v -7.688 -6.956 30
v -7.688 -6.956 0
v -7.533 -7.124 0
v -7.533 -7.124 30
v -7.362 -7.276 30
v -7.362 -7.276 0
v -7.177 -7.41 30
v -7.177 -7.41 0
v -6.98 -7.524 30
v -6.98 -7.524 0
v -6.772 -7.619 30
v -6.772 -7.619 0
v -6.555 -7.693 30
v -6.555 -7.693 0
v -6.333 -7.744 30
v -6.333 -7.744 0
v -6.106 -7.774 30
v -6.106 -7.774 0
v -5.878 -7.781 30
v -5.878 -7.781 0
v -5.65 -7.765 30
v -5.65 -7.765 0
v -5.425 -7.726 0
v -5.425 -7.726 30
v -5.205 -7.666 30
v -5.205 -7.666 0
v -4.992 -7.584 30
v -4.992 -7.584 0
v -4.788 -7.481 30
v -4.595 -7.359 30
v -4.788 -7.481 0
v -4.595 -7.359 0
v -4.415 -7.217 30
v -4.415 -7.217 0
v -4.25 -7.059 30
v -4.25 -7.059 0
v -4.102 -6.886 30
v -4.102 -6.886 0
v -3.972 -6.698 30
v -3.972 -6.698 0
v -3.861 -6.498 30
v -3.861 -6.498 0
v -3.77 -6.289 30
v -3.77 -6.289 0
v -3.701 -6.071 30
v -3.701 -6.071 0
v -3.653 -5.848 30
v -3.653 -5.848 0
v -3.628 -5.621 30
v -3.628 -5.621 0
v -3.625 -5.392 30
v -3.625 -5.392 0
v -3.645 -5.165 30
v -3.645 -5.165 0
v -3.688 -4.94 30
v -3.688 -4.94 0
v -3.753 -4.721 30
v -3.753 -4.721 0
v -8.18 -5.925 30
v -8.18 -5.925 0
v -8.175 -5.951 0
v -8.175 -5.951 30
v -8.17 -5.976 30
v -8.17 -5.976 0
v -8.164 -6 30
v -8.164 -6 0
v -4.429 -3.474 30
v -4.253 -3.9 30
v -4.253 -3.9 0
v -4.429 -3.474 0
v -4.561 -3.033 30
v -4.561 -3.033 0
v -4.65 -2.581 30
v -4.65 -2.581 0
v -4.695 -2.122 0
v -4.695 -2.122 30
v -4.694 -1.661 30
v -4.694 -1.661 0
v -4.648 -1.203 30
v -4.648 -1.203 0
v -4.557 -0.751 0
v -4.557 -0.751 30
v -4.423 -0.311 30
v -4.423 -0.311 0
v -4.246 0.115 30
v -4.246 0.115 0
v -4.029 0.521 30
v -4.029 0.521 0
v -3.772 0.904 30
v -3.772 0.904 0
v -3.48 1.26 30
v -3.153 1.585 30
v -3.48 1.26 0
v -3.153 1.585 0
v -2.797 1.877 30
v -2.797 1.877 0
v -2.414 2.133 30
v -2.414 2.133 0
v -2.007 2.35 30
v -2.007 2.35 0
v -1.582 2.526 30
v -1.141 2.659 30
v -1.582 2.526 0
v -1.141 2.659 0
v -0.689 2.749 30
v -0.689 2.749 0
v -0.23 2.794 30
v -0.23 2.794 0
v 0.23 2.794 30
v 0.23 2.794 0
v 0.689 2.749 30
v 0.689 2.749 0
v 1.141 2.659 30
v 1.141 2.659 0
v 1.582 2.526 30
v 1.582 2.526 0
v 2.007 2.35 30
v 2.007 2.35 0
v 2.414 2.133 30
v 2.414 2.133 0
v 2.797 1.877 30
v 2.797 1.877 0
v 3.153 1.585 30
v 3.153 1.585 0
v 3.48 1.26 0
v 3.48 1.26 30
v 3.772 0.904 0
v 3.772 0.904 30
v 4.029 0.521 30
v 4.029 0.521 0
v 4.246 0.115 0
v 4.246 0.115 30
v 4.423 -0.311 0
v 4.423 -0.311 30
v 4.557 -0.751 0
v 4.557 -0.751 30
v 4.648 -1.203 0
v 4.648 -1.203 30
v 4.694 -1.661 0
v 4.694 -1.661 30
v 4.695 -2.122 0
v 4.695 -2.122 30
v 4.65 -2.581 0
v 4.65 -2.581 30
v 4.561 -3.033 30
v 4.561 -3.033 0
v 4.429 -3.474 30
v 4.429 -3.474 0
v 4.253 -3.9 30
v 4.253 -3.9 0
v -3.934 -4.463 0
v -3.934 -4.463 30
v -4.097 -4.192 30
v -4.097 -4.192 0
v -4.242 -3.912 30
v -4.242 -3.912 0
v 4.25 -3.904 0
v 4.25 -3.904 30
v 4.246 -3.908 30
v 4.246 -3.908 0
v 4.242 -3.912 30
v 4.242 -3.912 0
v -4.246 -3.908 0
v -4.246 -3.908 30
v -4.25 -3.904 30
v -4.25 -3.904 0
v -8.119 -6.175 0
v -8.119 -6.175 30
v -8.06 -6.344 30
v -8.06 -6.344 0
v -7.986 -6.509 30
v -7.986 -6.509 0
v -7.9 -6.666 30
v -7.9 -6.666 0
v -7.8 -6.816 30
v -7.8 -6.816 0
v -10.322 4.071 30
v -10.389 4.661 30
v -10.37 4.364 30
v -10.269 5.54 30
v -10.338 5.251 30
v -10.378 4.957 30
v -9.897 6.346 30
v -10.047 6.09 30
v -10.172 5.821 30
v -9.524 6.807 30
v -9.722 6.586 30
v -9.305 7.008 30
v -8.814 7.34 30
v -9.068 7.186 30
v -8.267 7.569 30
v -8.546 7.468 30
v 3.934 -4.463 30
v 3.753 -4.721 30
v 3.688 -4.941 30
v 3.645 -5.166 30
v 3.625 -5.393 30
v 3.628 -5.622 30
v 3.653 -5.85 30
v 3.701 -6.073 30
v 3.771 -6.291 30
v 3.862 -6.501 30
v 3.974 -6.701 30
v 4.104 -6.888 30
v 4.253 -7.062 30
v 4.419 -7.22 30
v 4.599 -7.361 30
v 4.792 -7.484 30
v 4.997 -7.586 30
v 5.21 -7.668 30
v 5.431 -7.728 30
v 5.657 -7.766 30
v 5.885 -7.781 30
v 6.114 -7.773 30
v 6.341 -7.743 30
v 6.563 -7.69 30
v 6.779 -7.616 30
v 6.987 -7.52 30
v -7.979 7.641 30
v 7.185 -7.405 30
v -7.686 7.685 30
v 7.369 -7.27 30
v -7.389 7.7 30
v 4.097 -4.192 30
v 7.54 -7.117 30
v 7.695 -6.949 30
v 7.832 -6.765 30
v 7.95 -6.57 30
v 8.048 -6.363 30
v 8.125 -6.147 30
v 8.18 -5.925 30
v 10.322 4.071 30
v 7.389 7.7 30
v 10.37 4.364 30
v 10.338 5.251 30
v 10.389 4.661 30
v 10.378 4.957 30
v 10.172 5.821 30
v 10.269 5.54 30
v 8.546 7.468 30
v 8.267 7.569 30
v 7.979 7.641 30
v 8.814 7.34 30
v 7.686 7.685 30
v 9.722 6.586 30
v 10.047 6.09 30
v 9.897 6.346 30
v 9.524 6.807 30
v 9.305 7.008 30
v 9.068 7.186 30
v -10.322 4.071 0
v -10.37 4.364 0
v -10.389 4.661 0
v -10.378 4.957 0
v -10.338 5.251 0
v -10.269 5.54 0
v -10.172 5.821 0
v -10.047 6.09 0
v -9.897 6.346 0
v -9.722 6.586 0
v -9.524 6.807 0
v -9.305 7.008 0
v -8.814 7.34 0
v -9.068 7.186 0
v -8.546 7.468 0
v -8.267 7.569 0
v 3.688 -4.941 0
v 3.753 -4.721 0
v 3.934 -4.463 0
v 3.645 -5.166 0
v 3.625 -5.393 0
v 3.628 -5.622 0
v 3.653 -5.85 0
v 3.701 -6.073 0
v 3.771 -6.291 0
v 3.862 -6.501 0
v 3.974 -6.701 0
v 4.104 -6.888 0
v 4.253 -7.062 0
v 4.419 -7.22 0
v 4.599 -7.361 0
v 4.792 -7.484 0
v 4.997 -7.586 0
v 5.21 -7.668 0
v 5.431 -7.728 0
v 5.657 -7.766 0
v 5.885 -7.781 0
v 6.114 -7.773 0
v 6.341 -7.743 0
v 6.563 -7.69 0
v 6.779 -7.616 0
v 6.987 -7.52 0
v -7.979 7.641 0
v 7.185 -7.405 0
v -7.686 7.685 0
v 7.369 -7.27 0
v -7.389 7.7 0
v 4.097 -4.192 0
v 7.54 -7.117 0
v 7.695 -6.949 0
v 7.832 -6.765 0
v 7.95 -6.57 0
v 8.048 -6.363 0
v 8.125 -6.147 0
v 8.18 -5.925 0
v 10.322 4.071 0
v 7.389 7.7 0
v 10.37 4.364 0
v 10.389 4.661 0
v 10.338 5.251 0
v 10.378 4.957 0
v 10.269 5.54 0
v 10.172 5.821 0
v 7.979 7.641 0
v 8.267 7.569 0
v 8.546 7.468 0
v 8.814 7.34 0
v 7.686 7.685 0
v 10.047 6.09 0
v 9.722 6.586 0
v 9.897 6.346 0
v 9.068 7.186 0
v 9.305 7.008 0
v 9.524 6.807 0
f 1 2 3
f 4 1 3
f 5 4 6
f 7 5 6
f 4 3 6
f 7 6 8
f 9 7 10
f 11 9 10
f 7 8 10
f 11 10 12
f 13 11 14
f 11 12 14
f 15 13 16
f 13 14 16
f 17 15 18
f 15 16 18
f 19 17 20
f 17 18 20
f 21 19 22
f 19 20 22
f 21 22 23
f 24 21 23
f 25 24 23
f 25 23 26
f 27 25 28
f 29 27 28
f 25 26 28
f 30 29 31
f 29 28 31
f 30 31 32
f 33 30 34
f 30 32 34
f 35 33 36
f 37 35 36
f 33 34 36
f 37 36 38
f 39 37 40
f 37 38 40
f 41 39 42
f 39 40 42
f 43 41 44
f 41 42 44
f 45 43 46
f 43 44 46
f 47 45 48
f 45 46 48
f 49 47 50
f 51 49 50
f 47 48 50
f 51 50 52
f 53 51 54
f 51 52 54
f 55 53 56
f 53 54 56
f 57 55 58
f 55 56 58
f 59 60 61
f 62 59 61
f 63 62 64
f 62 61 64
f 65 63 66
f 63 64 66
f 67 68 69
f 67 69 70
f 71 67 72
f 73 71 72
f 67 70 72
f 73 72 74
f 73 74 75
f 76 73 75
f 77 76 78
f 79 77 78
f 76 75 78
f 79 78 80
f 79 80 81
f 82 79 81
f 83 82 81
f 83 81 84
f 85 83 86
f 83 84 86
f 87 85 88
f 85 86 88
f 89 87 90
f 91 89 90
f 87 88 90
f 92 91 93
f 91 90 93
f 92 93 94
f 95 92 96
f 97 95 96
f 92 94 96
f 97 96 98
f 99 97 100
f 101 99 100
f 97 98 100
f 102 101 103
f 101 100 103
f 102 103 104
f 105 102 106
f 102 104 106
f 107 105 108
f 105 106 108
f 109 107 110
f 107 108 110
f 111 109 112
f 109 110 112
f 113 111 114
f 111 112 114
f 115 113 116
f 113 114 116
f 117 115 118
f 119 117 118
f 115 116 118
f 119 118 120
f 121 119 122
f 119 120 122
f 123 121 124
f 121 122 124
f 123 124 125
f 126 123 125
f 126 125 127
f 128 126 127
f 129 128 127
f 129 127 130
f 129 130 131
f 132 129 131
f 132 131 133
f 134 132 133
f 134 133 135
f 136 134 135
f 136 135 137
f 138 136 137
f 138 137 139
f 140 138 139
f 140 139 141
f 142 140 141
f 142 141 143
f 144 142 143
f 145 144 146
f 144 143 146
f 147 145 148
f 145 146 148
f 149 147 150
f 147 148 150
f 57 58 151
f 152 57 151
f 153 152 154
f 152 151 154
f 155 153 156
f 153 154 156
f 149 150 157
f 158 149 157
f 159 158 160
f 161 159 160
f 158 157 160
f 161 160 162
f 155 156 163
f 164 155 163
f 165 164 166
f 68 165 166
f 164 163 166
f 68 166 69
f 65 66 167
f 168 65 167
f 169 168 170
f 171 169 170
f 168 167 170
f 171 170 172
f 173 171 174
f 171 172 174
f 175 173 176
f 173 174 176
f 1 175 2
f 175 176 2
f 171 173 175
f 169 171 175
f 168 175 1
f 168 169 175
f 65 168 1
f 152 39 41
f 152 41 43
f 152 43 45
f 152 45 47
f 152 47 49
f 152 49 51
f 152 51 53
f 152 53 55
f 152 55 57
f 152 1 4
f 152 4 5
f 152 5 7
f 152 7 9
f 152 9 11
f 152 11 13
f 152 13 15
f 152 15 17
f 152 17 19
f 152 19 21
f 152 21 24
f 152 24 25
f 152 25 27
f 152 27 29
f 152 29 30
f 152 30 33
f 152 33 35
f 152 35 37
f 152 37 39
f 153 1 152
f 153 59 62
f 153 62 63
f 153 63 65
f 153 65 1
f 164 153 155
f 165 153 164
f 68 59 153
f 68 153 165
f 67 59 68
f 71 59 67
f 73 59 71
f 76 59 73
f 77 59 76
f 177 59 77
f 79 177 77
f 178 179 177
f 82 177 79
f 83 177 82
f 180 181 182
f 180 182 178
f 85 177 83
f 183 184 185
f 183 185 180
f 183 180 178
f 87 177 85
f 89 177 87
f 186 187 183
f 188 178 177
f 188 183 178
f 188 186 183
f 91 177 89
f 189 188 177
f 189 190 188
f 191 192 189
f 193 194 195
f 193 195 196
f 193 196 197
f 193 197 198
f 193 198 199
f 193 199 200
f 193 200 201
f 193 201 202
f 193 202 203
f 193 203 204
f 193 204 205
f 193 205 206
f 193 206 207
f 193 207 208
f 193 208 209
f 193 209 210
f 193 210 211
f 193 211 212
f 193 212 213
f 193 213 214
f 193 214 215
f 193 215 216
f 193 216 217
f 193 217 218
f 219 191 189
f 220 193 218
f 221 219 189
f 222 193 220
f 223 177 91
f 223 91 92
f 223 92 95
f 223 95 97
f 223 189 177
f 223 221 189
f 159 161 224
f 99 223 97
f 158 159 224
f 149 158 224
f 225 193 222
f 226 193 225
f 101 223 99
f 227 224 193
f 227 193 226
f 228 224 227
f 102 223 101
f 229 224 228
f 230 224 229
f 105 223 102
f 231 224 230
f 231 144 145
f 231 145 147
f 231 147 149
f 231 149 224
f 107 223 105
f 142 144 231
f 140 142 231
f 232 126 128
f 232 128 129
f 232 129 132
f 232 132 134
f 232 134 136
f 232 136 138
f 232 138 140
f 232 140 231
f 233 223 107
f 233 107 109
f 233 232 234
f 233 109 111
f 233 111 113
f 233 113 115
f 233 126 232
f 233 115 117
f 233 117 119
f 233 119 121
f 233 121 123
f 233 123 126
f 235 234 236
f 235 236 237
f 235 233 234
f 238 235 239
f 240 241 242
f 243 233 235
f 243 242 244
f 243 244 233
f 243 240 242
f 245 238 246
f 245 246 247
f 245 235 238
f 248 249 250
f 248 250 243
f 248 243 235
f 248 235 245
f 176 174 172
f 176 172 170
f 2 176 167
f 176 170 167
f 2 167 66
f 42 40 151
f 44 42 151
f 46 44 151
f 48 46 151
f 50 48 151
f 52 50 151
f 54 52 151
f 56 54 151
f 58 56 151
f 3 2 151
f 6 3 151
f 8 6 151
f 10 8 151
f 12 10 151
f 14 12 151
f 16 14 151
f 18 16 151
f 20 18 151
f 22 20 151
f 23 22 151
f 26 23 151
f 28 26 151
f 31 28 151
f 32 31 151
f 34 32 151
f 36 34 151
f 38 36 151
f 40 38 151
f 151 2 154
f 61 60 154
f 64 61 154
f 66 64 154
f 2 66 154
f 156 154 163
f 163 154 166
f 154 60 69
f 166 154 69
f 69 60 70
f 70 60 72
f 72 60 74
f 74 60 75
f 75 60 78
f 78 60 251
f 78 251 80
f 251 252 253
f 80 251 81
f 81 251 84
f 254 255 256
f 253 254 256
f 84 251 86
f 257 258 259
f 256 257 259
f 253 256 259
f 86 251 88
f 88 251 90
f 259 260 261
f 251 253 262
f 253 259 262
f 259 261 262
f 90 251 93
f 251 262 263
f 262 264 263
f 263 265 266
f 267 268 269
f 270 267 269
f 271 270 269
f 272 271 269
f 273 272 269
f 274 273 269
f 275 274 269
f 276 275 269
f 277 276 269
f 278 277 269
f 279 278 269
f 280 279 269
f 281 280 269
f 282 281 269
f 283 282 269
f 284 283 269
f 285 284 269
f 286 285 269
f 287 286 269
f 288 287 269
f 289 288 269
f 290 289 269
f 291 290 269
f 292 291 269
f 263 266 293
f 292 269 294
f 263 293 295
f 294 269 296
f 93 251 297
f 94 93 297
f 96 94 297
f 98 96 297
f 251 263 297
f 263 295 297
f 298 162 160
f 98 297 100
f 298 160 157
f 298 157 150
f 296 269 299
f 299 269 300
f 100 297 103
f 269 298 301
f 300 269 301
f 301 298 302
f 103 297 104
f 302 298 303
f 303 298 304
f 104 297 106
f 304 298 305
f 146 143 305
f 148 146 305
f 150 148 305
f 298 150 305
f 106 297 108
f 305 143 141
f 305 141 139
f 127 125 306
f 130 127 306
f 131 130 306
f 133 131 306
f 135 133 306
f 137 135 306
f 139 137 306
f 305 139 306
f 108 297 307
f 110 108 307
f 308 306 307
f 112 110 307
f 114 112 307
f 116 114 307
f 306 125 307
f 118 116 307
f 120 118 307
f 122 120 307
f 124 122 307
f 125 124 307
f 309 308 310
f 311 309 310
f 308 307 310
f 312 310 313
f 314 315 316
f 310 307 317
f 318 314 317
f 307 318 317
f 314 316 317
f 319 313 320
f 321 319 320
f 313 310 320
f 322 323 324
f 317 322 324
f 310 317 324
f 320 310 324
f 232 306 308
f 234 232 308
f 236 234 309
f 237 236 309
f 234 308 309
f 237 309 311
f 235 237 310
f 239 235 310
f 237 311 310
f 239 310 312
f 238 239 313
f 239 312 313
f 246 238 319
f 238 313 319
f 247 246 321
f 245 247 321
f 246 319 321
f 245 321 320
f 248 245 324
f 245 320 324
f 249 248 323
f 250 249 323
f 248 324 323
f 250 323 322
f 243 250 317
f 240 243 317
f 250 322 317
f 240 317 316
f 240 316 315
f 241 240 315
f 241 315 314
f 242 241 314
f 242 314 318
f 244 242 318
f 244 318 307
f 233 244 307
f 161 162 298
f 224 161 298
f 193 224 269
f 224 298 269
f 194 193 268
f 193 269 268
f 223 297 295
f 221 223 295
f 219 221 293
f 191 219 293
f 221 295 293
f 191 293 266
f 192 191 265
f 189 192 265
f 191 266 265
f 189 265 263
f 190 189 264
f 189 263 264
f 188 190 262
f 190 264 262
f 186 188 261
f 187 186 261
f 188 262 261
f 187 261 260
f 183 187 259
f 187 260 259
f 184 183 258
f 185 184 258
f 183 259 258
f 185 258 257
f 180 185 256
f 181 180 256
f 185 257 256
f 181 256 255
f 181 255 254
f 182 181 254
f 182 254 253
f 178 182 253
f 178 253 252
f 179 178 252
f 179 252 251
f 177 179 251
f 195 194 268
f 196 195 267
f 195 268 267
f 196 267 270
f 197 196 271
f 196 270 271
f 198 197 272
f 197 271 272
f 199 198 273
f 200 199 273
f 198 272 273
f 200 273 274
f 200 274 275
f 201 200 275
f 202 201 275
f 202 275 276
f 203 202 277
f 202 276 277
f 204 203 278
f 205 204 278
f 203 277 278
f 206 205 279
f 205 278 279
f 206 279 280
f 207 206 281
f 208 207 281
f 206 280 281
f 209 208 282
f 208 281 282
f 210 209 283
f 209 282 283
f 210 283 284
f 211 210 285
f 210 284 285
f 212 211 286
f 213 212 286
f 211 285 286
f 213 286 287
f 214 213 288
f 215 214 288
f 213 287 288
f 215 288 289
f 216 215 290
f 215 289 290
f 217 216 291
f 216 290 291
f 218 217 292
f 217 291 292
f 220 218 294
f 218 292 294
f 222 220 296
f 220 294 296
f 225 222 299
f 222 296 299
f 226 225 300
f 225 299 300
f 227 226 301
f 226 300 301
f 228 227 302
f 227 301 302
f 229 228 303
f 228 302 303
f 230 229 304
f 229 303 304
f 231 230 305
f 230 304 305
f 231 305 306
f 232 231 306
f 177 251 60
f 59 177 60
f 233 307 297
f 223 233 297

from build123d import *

# Parameters (mm, degrees)
F1_DEPTH = 30


with BuildPart() as f1:
    # F0 (on Top) → F1 (new body)
    with BuildSketch(Plane.XY):
        with BuildLine():
            ThreePointArc((3.752684, -4.721397), (5.320047, -7.70051), (8.180264, -5.925433))
            Line((8.180264, -5.925433), (10.322446, 4.071413))
            ThreePointArc((10.322446, 4.071413), (9.722037, 6.586033), (7.389038, 7.7))
            Line((7.389038, 7.7), (-7.389038, 7.7))
            ThreePointArc((-7.389038, 7.7), (-9.722037, 6.586033), (-10.322446, 4.071413))
            Line((-10.322446, 4.071413), (-8.180264, -5.925433))
            Line((-8.180264, -5.925433), (-8.164181, -6.000488))
            ThreePointArc((-8.164181, -6.000488), (-7.982367, -6.506508), (-7.688034, -6.956488))
            ThreePointArc((-7.688034, -6.956488), (-4.787716, -7.481058), (-3.752684, -4.721397))
            ThreePointArc((-3.752684, -4.721397), (-4.017831, -4.328982), (-4.242095, -3.911851))
            ThreePointArc((-4.242095, -3.911851), (-4.247654, -3.905916), (-4.253234, -3.9))
            ThreePointArc((-4.253234, -3.9), (0, 2.8), (4.253234, -3.9))
            ThreePointArc((4.253234, -3.9), (4.247654, -3.905916), (4.242095, -3.911851))
            ThreePointArc((4.242095, -3.911851), (4.017831, -4.328982), (3.752684, -4.721397))
        make_face()
        with BuildLine():
            Line((-8.164181, -6.000488), (-8.180264, -5.925433))
            ThreePointArc((-8.180264, -5.925433), (-8.172536, -5.963027), (-8.164181, -6.000488))
        make_face()
        with BuildLine():
            ThreePointArc((-7.688034, -6.956488), (-7.982367, -6.506508), (-8.164181, -6.000488))
            ThreePointArc((-8.164181, -6.000488), (-7.986414, -6.508524), (-7.688034, -6.956488))
        make_face()
    extrude(amount=F1_DEPTH)


solid = f1.part
